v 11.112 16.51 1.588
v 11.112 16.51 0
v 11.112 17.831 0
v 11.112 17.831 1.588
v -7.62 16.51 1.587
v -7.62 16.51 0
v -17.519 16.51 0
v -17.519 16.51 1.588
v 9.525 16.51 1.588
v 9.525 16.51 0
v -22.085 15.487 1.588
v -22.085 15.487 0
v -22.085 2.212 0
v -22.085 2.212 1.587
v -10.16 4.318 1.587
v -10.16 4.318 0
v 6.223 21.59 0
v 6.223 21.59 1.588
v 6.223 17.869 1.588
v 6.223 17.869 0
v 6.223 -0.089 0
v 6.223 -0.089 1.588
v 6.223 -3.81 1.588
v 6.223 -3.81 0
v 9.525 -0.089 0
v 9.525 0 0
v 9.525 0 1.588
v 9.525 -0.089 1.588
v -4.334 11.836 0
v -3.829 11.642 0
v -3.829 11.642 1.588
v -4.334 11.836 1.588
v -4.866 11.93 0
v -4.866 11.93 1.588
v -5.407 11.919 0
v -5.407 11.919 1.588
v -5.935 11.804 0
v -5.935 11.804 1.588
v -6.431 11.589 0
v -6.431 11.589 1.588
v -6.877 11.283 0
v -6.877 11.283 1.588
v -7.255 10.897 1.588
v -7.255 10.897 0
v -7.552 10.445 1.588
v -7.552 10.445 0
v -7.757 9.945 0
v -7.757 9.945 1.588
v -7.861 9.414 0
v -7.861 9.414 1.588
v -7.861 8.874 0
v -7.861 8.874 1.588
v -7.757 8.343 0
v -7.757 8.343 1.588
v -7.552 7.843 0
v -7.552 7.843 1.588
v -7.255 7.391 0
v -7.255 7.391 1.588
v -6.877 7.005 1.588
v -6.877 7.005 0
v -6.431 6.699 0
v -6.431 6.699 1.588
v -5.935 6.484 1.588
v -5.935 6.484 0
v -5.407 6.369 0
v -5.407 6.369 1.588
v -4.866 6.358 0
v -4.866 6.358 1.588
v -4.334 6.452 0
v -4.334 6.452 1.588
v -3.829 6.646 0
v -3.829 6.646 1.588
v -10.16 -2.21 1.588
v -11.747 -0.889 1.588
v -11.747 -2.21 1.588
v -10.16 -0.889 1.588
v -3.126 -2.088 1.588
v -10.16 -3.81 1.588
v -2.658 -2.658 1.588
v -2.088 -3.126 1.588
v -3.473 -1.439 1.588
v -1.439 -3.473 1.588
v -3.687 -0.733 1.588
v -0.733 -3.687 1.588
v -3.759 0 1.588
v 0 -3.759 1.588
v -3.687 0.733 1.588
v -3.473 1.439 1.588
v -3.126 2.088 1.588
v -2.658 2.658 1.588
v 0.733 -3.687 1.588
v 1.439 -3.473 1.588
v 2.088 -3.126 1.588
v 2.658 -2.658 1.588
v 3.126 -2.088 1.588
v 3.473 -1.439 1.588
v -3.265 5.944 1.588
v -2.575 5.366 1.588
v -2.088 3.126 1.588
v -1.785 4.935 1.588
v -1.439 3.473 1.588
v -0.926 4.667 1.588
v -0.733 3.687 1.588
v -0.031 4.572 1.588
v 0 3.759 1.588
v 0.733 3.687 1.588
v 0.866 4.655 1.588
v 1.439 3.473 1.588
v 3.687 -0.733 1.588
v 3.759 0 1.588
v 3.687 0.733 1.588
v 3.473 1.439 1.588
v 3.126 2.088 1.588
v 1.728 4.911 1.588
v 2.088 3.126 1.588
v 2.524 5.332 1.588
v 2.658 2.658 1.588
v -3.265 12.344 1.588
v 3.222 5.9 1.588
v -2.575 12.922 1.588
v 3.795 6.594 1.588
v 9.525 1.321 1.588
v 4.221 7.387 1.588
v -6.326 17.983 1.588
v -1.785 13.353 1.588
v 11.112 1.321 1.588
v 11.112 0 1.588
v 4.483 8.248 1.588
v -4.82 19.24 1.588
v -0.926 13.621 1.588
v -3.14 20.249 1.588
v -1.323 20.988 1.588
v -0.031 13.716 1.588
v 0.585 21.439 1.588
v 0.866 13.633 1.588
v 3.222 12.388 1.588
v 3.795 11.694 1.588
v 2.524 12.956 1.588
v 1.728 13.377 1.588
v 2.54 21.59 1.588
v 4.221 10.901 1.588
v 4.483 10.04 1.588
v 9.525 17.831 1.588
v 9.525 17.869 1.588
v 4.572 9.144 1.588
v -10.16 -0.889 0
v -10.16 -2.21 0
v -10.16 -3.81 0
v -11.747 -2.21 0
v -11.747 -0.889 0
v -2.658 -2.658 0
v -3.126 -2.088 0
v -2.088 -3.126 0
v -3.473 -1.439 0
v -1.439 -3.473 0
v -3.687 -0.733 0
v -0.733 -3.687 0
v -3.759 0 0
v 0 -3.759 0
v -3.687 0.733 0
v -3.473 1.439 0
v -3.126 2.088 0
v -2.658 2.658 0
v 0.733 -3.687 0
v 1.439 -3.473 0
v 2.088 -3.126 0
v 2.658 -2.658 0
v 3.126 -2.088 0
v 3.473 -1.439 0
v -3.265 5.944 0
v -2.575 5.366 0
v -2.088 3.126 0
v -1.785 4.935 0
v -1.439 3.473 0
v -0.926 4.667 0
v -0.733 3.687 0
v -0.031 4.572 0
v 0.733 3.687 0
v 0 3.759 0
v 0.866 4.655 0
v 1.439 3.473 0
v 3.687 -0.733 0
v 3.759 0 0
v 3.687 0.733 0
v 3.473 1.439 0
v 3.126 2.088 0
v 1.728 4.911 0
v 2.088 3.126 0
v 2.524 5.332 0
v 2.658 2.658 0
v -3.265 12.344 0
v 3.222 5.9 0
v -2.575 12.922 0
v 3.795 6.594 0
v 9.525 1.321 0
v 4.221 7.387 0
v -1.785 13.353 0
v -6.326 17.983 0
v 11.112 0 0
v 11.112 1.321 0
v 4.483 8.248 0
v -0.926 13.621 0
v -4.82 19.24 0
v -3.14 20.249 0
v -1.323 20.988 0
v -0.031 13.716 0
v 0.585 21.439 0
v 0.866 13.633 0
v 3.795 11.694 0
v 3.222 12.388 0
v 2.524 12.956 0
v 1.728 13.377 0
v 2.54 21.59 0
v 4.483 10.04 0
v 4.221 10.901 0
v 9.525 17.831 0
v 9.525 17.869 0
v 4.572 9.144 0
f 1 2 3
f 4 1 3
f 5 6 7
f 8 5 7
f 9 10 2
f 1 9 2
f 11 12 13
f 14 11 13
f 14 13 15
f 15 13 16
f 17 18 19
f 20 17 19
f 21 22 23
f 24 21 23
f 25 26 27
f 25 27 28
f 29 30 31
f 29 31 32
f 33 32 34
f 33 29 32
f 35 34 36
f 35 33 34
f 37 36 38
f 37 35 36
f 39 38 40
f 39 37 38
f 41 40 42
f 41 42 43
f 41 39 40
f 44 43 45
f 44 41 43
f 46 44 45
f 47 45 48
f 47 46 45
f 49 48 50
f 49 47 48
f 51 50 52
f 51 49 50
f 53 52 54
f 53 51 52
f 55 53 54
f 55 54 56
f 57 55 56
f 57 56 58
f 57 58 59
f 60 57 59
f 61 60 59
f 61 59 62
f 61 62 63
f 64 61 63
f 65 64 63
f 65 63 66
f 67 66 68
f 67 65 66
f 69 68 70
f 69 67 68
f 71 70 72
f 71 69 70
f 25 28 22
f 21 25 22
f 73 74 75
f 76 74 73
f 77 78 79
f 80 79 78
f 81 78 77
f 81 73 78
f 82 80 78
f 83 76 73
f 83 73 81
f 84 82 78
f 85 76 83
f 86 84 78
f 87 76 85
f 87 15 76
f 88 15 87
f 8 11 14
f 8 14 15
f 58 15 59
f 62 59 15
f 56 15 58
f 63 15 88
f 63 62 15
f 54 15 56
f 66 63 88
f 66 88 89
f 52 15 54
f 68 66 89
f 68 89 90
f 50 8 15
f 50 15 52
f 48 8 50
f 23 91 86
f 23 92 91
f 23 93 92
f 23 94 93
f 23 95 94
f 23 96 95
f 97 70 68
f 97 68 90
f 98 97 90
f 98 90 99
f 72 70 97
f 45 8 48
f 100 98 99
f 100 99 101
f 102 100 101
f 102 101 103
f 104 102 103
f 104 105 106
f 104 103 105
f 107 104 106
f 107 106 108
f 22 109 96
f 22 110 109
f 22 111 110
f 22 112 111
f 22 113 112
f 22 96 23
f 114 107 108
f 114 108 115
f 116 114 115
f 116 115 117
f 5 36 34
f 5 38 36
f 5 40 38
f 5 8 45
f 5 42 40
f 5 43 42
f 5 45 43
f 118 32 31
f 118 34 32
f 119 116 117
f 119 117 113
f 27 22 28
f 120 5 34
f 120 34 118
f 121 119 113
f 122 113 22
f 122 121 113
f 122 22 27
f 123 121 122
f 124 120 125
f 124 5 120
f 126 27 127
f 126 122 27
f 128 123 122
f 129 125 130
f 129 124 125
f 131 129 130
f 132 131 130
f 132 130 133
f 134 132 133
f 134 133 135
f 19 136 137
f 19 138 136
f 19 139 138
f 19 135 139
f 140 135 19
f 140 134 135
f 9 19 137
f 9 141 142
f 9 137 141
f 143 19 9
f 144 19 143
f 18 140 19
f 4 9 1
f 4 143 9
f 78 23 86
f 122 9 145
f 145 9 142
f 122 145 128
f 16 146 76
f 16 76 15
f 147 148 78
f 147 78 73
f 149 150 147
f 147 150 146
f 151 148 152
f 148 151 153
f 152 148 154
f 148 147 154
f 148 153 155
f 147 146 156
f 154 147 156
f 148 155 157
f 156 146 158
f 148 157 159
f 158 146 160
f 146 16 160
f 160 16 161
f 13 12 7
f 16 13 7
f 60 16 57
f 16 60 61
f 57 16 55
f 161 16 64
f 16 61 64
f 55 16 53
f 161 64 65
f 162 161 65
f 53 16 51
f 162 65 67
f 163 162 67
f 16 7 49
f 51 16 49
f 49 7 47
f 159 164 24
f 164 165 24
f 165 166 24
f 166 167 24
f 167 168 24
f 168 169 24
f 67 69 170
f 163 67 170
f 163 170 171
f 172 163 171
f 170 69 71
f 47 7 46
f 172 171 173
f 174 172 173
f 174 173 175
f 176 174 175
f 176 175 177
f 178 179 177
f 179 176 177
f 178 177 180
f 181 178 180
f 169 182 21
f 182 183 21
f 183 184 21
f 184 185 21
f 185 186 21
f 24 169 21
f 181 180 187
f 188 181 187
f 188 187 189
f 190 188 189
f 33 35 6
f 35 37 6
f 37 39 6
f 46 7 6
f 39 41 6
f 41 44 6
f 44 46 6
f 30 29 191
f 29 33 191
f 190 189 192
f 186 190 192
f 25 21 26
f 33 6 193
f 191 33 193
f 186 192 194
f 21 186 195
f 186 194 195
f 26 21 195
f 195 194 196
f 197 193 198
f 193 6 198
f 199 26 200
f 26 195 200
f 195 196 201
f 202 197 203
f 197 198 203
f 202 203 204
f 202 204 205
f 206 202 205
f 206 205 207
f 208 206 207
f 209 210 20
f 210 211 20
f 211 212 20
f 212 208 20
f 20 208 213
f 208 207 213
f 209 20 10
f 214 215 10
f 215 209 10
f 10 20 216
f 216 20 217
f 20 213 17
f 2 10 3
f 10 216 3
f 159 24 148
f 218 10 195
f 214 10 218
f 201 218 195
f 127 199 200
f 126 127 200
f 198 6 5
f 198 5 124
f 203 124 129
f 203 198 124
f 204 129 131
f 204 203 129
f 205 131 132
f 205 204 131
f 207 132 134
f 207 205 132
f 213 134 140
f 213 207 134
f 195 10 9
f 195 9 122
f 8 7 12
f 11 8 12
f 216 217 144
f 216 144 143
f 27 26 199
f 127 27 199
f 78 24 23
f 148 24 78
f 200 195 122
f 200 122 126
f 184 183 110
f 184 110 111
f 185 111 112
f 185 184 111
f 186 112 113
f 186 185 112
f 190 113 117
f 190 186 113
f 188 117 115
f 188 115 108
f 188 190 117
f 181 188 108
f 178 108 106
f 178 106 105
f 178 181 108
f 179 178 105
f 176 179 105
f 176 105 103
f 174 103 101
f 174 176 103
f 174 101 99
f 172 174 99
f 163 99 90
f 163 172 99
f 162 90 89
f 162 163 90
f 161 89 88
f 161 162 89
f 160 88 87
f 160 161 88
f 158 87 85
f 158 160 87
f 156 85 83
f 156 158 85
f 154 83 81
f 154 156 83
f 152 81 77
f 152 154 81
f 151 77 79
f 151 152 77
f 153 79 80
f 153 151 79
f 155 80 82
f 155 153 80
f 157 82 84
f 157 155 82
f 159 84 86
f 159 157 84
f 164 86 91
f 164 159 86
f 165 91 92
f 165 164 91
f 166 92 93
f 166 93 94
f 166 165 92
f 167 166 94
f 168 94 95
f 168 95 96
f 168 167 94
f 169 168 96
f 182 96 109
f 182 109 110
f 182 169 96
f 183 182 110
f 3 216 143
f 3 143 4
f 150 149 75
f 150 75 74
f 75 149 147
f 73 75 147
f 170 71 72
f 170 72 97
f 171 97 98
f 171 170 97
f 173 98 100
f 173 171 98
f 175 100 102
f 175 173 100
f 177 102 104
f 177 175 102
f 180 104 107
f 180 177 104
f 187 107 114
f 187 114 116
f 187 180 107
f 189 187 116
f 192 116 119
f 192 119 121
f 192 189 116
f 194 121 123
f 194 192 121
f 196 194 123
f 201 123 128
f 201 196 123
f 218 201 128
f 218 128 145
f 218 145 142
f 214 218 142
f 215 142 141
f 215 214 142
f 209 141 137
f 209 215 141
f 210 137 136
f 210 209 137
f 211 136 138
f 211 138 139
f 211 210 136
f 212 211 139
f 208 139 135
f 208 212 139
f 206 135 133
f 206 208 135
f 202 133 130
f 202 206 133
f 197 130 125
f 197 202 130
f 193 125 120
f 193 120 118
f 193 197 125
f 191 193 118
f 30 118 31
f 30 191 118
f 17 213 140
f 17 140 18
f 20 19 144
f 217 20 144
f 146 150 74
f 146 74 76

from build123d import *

# Parameters (mm, degrees)
SKETCH1_R           = 3.7592
SKETCH1_W           = 1.5875
SKETCH1_H           = 1.3208
BOSS_EXTRUDE1_DEPTH = 1.5875
CUT_EXTRUDE1_REACH  = 32.926


with BuildPart() as part:
    # Sketch1 → Boss-Extrude1 (new body)
    # profile 1 of 6: a face of its own
    with BuildSketch(Plane.XY):
        with BuildLine():
            Line((2.54, 21.59), (9.525, 21.59))
            Line((9.525, 21.59), (9.525, -3.81))
            Line((9.525, -3.81), (-10.16, -3.81))
            Line((-10.16, -3.81), (-10.16, 8.89))
            ThreePointArc((-10.16, 8.89), (-6.440256121, 17.870256121), (2.54, 21.59))
        make_face()
        Circle(SKETCH1_R, mode=Mode.SUBTRACT)
        with BuildLine():
            ThreePointArc((-3.82905, 11.642311449), (-7.874, 9.144), (-3.82905, 6.645688551))
            ThreePointArc((-3.82905, 6.645688551), (4.572, 9.144), (-3.82905, 11.642311449))
        make_face(mode=Mode.SUBTRACT)
    # profile 2 of 6: a face of its own
    with BuildSketch(Plane.XY):
        with Locations((-10.95375, -1.5494)):
            Rectangle(SKETCH1_W, SKETCH1_H)
    # profile 3 of 6: a face of its own
    with BuildSketch(Plane.XY):
        with Locations((10.31875, 17.1704)):
            Rectangle(SKETCH1_W, SKETCH1_H)
    # profile 4 of 6: a face of its own
    with BuildSketch(Plane.XY):
        with Locations((10.31875, 0.6604)):
            Rectangle(SKETCH1_W, SKETCH1_H)
    # profile 5 of 6: a face of its own
    with BuildSketch(Plane.XY):
        with BuildLine():
            ThreePointArc((-10.16, 8.89), (-9.508277885, 12.906092628), (-7.62, 16.51))
            Line((-7.62, 16.51), (-17.51946076, 16.51))
            Line((-17.51946076, 16.51), (-22.084921519, 15.486982224))
            Line((-22.084921519, 15.486982224), (-22.084921519, 13.081))
            Line((-22.084921519, 13.081), (-22.084921519, 4.699))
            Line((-22.084921519, 4.699), (-22.084921519, 2.212007412))
            Line((-22.084921519, 2.212007412), (-10.16, 4.318))
            Line((-10.16, 4.318), (-10.16, 8.89))
        make_face()
    # profile 6 of 6: a face of its own
    with BuildSketch(Plane.XY):
        with BuildLine():
            ThreePointArc((-10.16, 8.89), (-9.508277885, 12.906092628), (-7.62, 16.51))
            Line((-7.62, 16.51), (-17.51946076, 16.51))
            Line((-17.51946076, 16.51), (-22.084921519, 15.486982224))
            Line((-22.084921519, 15.486982224), (-22.084921519, 13.081))
            Line((-22.084921519, 13.081), (-22.084921519, 4.699))
            Line((-22.084921519, 4.699), (-22.084921519, 2.212007412))
            Line((-22.084921519, 2.212007412), (-10.16, 4.318))
            Line((-10.16, 4.318), (-10.16, 8.89))
        make_face()
    extrude(amount=BOSS_EXTRUDE1_DEPTH)

    # Sketch2 → Cut-Extrude1 (cut, up to next)
    with BuildSketch(Plane.XY.offset(1.5875), mode=Mode.PRIVATE) as cut_extrude1_sk1:
        Polygon((6.223, -0.0889), (6.223, -3.81), (9.525, -3.81), (9.525, -3.0226), (9.525, -0.9144), (9.525, -0.0889), align=None)
    cut_extrude1_tool1 = extrude(cut_extrude1_sk1.sketch, amount=-CUT_EXTRUDE1_REACH, mode=Mode.PRIVATE) & part.part
    # Sketch2 → Cut-Extrude1 (cut, up to next)
    with BuildSketch(Plane.XY.offset(1.5875), mode=Mode.PRIVATE) as cut_extrude1_sk2:
        Polygon((9.525, 18.6944), (9.525, 20.8026), (9.525, 21.59), (6.223, 21.59), (6.223, 17.8689), (9.525, 17.8689), align=None)
    cut_extrude1_tool2 = extrude(cut_extrude1_sk2.sketch, amount=-CUT_EXTRUDE1_REACH, mode=Mode.PRIVATE) & part.part
    add(cut_extrude1_tool1.solids().sort_by_distance((7.874, -1.94945, 1.5875))[0], mode=Mode.SUBTRACT)
    add(cut_extrude1_tool2.solids().sort_by_distance((7.874, 19.72945, 1.5875))[0], mode=Mode.SUBTRACT)


solid = part.part
